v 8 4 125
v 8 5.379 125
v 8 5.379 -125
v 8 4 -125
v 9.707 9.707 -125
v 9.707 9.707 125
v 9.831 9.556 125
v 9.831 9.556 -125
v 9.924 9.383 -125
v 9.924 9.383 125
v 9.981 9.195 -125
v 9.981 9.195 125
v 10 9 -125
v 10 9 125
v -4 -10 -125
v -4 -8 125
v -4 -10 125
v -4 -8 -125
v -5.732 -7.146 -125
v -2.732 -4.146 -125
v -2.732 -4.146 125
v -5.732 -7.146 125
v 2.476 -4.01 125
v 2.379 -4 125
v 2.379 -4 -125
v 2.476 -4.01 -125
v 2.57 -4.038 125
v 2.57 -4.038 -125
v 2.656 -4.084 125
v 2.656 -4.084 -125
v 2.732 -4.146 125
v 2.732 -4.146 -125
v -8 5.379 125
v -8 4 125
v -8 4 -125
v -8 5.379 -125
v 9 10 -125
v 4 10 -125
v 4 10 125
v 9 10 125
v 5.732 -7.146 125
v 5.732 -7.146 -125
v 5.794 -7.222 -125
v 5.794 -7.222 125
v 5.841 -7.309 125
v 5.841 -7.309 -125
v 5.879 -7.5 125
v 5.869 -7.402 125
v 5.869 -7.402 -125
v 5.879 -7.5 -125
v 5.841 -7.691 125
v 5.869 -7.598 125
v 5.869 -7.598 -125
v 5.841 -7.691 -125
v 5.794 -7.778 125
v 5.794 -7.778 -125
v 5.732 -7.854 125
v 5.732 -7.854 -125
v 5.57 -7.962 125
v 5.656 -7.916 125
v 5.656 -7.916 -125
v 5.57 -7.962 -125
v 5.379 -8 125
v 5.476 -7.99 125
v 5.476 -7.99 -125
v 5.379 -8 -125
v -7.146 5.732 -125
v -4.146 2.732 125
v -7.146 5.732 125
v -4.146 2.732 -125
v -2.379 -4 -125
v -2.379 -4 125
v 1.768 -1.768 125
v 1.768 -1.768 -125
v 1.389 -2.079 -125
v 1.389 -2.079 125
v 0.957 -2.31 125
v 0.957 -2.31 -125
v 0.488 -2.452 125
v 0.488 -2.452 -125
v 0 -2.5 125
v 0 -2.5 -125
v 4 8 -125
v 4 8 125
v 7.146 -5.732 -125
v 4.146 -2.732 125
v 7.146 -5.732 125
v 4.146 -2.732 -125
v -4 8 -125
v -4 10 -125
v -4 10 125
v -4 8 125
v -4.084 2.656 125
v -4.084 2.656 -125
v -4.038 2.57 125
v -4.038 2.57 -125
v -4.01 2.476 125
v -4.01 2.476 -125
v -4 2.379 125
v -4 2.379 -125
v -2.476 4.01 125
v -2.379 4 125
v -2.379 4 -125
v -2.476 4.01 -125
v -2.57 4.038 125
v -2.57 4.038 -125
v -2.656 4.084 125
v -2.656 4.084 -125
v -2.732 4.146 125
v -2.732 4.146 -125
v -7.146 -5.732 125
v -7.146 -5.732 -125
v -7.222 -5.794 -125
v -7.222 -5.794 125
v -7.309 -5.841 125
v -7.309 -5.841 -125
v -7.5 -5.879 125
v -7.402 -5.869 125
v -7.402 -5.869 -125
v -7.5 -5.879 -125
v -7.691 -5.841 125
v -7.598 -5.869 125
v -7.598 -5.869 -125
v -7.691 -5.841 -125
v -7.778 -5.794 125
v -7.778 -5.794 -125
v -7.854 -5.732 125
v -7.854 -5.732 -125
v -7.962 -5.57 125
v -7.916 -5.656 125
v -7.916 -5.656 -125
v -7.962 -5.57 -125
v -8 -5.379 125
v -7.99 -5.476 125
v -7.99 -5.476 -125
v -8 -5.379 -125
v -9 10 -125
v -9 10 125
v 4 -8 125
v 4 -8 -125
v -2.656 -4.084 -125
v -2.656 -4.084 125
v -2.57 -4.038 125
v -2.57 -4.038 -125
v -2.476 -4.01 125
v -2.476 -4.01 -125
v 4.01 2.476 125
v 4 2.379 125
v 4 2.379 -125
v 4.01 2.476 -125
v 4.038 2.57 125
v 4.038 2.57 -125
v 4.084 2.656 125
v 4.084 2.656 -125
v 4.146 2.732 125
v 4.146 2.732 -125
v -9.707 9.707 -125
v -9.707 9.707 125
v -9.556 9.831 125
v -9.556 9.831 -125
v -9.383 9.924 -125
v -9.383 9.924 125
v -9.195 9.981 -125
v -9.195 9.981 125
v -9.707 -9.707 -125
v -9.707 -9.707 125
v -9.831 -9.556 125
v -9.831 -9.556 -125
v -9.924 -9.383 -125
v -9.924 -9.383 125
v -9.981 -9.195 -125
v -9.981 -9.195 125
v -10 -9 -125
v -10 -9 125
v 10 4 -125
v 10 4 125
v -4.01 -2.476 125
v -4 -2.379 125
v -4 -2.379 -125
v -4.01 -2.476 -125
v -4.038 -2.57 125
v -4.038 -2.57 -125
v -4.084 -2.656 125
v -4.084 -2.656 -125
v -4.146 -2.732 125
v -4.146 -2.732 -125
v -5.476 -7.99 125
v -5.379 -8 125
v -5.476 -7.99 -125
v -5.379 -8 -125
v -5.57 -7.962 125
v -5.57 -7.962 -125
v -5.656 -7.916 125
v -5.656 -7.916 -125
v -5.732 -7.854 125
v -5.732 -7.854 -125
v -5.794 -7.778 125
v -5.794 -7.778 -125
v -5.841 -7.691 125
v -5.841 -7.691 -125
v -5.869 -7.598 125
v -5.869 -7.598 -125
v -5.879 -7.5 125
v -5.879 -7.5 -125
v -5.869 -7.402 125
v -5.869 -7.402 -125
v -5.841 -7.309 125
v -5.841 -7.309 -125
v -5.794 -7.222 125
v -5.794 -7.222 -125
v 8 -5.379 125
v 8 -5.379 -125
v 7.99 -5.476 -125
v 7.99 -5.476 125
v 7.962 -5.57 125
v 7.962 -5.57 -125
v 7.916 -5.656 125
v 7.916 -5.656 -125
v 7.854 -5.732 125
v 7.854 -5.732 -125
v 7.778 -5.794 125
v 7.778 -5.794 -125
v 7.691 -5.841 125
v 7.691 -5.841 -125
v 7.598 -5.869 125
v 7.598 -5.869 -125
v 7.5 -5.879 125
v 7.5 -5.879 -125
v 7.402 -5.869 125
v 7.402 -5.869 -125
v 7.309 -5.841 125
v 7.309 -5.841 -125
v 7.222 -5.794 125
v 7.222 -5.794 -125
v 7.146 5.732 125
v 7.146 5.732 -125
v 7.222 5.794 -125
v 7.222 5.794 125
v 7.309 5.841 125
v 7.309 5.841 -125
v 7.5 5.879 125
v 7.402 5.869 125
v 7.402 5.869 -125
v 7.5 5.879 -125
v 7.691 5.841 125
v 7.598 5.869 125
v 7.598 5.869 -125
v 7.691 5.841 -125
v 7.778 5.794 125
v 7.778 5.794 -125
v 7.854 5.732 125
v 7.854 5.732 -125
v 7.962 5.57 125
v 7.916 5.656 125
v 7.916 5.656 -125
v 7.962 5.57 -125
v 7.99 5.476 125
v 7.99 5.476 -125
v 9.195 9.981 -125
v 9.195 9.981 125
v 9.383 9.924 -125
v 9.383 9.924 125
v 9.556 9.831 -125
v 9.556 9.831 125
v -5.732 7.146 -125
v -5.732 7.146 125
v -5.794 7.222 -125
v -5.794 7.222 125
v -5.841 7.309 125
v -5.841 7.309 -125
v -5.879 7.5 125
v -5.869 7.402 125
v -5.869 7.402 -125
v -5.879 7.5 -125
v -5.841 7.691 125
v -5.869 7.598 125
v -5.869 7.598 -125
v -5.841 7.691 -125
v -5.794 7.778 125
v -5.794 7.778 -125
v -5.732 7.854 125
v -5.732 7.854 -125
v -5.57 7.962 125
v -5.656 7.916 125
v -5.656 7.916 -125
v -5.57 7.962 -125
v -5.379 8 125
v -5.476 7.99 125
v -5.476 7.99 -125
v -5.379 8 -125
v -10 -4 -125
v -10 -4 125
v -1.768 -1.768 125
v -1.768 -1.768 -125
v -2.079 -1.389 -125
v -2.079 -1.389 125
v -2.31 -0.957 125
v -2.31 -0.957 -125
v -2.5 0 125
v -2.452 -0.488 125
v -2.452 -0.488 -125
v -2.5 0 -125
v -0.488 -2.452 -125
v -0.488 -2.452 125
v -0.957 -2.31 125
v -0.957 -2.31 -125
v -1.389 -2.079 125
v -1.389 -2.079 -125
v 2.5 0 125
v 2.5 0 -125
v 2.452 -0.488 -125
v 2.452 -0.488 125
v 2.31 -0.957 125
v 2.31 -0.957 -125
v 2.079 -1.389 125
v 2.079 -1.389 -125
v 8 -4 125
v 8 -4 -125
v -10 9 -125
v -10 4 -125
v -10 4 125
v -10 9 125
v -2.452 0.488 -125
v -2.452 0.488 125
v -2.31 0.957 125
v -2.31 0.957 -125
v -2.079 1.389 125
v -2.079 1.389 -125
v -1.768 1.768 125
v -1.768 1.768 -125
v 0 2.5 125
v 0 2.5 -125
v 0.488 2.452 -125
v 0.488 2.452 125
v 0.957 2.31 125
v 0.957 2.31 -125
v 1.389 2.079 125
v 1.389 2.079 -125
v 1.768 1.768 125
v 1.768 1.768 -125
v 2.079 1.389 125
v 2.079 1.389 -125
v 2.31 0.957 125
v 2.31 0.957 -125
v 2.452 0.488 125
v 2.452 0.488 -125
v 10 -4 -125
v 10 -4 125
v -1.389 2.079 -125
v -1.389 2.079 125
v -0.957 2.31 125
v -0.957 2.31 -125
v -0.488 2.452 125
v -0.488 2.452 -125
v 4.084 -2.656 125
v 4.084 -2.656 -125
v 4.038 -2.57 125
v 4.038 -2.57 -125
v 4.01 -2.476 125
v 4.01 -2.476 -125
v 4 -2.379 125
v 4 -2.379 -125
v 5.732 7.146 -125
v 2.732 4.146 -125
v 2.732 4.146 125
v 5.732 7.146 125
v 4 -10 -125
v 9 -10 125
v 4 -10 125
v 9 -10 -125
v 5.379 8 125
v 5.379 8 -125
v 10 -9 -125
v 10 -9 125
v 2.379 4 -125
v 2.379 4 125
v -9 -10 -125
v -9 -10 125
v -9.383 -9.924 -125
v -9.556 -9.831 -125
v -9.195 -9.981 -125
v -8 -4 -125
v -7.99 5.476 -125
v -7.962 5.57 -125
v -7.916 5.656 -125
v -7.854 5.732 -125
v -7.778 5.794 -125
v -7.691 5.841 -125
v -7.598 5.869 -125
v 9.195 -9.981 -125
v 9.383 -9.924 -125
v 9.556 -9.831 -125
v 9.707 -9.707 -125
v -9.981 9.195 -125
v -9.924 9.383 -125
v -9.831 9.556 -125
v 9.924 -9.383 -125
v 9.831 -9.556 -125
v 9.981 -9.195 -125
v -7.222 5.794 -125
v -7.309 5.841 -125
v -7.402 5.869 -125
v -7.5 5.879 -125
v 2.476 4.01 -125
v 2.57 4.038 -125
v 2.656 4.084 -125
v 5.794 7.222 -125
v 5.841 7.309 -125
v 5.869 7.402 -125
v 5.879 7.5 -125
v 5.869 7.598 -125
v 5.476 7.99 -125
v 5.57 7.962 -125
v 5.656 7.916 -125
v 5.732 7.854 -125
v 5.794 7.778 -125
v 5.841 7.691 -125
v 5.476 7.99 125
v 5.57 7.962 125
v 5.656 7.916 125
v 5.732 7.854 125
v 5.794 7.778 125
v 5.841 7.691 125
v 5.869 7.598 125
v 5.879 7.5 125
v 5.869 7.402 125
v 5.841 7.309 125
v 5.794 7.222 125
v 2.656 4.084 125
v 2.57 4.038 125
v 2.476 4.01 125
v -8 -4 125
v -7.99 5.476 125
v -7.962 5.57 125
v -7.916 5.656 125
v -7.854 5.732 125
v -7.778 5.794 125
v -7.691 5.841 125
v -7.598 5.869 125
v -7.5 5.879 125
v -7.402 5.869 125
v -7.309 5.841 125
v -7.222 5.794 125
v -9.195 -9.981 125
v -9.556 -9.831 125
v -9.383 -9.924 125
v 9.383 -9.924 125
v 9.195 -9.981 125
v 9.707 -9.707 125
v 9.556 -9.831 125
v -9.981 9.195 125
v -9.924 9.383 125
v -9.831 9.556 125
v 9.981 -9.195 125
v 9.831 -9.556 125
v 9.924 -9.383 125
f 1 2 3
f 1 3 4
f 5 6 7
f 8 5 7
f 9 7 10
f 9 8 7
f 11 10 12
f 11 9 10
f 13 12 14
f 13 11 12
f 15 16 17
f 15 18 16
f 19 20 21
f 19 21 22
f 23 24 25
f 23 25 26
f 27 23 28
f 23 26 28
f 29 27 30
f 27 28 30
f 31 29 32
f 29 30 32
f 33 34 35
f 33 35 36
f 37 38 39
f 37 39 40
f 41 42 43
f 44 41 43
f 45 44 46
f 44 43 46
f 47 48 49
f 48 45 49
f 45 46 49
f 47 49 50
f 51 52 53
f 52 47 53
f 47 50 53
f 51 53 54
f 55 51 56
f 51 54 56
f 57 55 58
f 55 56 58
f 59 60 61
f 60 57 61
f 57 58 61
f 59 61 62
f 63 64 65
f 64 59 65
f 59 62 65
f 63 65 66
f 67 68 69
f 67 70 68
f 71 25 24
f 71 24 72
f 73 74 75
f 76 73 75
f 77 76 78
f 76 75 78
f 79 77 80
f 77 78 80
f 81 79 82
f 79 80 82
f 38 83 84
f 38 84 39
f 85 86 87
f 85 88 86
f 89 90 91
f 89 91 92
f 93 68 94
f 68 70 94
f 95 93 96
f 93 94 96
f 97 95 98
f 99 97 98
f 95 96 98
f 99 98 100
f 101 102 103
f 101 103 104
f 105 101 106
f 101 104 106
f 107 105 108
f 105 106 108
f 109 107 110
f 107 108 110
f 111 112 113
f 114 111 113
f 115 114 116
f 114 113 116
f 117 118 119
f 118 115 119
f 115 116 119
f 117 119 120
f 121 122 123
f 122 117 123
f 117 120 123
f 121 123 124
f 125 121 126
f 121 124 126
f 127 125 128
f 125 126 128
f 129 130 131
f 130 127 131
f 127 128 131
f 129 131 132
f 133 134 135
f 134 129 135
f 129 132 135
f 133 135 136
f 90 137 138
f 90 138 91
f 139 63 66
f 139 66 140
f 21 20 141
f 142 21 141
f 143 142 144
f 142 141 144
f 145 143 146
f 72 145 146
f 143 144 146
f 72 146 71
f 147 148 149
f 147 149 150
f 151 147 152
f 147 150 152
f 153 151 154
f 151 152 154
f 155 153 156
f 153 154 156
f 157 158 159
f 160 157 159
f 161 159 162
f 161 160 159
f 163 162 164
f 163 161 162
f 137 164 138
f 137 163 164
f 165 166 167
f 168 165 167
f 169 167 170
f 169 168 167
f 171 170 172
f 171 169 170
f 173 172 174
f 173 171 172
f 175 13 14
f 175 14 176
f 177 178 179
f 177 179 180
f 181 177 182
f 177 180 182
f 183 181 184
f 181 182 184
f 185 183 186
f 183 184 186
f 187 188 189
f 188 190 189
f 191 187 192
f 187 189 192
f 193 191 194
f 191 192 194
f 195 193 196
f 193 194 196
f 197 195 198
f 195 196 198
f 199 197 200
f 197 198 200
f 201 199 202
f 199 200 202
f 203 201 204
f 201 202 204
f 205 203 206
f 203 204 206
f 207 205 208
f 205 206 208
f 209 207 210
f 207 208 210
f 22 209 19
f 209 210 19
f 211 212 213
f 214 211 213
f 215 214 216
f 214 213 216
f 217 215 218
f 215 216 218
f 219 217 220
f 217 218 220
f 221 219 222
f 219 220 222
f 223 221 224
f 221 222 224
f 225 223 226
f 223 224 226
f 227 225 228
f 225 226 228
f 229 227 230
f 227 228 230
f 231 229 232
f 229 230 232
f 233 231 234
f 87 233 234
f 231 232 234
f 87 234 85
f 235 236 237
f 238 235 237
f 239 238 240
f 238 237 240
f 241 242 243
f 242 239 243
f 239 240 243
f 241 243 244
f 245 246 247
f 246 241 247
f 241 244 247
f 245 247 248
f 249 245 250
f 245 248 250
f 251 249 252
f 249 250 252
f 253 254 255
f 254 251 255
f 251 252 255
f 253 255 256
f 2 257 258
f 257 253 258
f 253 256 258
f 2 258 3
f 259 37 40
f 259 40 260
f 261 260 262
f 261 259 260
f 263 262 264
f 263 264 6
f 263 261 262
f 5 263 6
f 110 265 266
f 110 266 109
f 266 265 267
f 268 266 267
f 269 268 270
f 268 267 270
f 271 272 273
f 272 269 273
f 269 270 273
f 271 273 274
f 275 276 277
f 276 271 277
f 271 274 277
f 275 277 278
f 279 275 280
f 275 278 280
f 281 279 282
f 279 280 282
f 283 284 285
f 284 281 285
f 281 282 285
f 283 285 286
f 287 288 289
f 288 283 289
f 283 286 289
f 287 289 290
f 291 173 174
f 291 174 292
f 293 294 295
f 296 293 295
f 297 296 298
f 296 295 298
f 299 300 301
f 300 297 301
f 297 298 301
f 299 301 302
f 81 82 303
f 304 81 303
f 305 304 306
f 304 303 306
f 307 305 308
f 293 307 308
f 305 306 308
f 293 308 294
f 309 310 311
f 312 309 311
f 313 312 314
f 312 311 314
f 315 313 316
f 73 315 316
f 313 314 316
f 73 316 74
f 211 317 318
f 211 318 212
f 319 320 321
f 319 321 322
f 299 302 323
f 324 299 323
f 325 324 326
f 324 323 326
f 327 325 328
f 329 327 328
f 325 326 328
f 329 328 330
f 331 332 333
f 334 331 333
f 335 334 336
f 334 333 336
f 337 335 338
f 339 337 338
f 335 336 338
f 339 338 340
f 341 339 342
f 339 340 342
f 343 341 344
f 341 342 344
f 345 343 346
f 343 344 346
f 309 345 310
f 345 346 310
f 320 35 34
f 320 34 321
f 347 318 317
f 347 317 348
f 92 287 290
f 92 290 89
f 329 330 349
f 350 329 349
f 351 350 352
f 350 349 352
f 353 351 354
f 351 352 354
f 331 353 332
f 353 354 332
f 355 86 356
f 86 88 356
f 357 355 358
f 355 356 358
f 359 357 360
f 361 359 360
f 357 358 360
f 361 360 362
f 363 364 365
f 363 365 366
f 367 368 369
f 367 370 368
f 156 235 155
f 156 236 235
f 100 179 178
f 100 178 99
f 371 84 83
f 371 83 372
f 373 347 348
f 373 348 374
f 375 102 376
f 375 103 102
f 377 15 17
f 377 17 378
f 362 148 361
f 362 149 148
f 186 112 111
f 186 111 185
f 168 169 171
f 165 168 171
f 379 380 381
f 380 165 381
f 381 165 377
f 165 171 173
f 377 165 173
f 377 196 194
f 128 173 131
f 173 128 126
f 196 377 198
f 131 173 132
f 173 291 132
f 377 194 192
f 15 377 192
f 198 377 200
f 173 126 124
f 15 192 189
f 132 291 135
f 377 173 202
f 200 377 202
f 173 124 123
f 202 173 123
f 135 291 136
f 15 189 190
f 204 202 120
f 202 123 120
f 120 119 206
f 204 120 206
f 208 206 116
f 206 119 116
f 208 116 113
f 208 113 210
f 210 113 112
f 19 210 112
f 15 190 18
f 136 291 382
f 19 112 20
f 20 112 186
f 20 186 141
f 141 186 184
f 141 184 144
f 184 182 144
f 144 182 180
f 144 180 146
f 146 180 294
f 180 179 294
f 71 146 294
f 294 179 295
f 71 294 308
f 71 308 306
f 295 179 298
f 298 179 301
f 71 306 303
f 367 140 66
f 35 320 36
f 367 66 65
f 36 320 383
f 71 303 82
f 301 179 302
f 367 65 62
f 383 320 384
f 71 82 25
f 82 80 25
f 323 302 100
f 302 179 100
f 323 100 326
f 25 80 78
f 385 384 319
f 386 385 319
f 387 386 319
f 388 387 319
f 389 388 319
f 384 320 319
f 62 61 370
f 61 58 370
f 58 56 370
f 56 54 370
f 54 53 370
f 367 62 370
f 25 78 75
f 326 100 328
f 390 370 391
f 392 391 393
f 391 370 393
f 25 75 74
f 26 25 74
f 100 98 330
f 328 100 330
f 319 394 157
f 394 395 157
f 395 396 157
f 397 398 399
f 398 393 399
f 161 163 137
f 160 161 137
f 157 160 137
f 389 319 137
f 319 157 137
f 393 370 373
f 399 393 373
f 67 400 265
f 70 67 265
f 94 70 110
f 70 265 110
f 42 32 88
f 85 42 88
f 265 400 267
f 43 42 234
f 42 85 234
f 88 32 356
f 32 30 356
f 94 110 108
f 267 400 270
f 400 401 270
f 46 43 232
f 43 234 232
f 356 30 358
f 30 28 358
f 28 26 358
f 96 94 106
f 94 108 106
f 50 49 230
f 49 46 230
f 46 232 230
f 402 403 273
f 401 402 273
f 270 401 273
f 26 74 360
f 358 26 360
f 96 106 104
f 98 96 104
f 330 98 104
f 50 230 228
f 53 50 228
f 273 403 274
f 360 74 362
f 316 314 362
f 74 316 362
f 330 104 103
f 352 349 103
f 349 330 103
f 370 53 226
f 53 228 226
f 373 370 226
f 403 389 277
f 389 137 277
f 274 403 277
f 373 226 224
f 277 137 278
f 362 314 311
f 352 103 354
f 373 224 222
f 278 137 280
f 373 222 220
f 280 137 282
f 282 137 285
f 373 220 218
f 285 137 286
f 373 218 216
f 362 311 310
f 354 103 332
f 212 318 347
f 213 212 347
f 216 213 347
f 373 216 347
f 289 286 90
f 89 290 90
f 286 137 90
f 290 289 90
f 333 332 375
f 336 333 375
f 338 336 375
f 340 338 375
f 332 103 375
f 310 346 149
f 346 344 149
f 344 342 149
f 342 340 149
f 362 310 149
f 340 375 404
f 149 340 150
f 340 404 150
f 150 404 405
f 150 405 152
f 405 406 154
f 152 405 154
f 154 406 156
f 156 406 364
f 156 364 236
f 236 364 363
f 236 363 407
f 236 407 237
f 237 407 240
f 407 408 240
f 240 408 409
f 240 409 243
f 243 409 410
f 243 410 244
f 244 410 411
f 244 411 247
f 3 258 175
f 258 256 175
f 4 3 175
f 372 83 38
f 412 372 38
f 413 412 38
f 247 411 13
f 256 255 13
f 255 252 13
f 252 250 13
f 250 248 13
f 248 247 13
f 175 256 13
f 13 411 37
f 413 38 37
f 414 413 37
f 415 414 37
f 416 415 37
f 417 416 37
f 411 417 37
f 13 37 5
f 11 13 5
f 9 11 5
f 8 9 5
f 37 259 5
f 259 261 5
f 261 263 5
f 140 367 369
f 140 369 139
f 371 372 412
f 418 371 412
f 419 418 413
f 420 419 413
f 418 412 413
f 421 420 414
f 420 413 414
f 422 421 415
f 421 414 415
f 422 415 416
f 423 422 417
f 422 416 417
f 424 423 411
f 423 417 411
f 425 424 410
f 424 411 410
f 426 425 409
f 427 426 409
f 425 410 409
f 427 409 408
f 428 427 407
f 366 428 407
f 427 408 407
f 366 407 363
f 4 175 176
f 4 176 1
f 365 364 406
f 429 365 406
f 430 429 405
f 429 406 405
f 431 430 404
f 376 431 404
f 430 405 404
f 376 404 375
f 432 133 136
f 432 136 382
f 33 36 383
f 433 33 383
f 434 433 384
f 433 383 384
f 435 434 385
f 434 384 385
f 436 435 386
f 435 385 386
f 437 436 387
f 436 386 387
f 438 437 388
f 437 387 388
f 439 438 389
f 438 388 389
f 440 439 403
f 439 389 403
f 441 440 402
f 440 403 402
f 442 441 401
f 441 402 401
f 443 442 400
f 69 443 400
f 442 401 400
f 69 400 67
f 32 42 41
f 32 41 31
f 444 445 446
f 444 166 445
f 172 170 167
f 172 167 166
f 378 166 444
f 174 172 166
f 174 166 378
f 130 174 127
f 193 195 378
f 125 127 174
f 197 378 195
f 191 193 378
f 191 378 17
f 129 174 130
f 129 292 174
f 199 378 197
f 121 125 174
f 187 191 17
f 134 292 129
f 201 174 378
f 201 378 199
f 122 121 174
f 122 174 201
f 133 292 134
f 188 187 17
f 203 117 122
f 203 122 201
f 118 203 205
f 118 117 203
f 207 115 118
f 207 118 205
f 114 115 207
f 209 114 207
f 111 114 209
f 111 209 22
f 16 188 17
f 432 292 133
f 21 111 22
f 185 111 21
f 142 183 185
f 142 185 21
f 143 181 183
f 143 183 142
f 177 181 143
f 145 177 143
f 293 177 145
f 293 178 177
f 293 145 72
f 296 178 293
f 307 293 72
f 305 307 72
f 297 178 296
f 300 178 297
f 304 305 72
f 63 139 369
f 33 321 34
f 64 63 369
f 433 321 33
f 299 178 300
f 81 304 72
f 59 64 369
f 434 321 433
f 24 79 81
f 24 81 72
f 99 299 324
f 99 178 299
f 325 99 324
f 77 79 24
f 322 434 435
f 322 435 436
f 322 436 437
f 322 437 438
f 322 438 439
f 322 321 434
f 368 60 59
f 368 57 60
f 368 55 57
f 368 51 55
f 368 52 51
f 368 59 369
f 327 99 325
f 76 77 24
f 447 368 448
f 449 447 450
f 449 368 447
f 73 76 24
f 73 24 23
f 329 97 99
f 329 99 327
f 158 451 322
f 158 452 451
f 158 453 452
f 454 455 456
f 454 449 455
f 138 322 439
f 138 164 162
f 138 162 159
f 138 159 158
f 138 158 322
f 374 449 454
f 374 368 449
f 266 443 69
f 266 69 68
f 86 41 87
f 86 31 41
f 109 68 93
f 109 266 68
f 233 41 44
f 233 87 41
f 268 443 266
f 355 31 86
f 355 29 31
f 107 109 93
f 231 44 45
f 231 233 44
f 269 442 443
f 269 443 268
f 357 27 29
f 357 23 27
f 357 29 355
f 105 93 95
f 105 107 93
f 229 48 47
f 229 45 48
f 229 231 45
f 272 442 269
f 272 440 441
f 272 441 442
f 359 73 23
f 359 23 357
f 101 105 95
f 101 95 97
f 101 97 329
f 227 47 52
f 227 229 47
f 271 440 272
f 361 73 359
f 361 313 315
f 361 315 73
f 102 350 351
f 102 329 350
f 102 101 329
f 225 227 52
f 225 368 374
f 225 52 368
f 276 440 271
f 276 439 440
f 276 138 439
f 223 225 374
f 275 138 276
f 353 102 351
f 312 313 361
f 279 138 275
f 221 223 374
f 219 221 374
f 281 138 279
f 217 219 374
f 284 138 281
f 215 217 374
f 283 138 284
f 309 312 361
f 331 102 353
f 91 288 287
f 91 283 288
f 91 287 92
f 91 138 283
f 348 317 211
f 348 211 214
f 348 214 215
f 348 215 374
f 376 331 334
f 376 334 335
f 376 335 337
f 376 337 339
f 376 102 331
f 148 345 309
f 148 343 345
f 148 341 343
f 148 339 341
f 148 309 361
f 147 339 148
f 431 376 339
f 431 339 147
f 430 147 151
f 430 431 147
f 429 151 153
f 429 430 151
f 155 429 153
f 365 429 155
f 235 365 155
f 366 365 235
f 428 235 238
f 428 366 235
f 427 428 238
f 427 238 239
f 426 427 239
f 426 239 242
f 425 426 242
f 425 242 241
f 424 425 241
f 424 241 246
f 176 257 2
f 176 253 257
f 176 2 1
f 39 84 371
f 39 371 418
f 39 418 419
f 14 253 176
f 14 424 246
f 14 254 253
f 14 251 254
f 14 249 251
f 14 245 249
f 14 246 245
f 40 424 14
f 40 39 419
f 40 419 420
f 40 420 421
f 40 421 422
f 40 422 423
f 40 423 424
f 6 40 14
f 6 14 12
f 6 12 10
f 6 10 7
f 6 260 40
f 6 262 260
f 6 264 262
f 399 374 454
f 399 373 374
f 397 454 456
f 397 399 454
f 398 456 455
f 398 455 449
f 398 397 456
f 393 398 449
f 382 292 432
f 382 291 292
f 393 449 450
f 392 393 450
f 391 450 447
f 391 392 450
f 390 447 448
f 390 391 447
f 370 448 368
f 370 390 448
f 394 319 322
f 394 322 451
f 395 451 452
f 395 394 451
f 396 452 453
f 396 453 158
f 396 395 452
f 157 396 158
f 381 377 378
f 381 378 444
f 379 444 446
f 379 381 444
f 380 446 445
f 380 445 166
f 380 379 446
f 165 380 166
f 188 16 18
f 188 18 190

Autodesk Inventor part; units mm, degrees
sketch "Esboço1" plane through (0, 0, 0) normal (0, 0, 1) x (1, 0, 0)
  line L0 (-10, 10) -> (10, 10) construction
  circle A0 centre (0, 0) radius 2.5 construction
  line L1 (-4, 4) -> (4, 4) construction
  line L2 (-4, 4) -> (-4, -4) construction
  line L3 (-10, 10) -> (0, 0) construction
  line L4 (-2.5858, 4) -> (-6.5858, 8) construction
  line L5 (-6.5858, 8) -> (0, 8) construction
  arc A1 (-5.3787, 8) -> (-5.7322, 7.1464) centre (-5.3787, 7.5) ccw
  arc A2 (-2.7322, 4.1464) -> (-2.3787, 4) centre (-2.3787, 4.5) ccw
  line L6 (0, 4) -> (-4, 4) construction
  line L7 (-2.3787, 4) -> (0, 4)
  line L8 (-4, 10) -> (-4, 8) construction
  line L9 (-5.3787, 8) -> (-4, 8)
  line L10 (-5.7322, 7.1464) -> (-2.7322, 4.1464)
  line L11 (-4, 10) -> (-4, 9) construction
  line L12 (-4, 9) -> (-4, 9) construction
  line L13 (-4, 10) -> (-4, 9)
  line L14 (-4, 9) -> (-4, 9)
  line L15 (-4, 9) -> (-4, 8)
  line L16 (0, 4) -> (0, 2.5)
  arc A3 (-9, 10) -> (-9.7071, 9.7071) centre (-9, 9) ccw
  line L17 (-9, 10) -> (-4, 10)
  line L18 (-9.7071, 9.7071) -> (-1.7678, 1.7678)
  arc A4 (0, 2.5) -> (-1.7678, 1.7678) centre (0, 0) ccw
  point P0 (0, 10)
  point P1 (-4, 0)
  point P2 (-5, 5)
  point P3 (-5.8406, 7.6913)
  point P4 (-9.3827, 9.9239)
  point P5 (-6.5, 10)
  dimension "d1" = 10
  dimension "d2" = 5
  dimension "d5" = 20
  dimension "d10" = 1
  dimension "d11" = 2
  dimension "d17" = 6
  dimension "d18" = 0.5
  dimension "d24" = 1
  dimension "d25" = 0.5
extrude "Extrusão1" add sketch "Esboço1" along normal mid plane 250
mirror "Espelhar1" about plane through (-9.7071, 9.7071, 0) normal (-0.7071, -0.7071, 0)
mirror "Espelhar2" about plane through (0, 0, 0) normal (1, 0, 0)
mirror "Espelhar3" about plane through (0, 0, 0) normal (0, 1, 0)
properties material "Aço"
